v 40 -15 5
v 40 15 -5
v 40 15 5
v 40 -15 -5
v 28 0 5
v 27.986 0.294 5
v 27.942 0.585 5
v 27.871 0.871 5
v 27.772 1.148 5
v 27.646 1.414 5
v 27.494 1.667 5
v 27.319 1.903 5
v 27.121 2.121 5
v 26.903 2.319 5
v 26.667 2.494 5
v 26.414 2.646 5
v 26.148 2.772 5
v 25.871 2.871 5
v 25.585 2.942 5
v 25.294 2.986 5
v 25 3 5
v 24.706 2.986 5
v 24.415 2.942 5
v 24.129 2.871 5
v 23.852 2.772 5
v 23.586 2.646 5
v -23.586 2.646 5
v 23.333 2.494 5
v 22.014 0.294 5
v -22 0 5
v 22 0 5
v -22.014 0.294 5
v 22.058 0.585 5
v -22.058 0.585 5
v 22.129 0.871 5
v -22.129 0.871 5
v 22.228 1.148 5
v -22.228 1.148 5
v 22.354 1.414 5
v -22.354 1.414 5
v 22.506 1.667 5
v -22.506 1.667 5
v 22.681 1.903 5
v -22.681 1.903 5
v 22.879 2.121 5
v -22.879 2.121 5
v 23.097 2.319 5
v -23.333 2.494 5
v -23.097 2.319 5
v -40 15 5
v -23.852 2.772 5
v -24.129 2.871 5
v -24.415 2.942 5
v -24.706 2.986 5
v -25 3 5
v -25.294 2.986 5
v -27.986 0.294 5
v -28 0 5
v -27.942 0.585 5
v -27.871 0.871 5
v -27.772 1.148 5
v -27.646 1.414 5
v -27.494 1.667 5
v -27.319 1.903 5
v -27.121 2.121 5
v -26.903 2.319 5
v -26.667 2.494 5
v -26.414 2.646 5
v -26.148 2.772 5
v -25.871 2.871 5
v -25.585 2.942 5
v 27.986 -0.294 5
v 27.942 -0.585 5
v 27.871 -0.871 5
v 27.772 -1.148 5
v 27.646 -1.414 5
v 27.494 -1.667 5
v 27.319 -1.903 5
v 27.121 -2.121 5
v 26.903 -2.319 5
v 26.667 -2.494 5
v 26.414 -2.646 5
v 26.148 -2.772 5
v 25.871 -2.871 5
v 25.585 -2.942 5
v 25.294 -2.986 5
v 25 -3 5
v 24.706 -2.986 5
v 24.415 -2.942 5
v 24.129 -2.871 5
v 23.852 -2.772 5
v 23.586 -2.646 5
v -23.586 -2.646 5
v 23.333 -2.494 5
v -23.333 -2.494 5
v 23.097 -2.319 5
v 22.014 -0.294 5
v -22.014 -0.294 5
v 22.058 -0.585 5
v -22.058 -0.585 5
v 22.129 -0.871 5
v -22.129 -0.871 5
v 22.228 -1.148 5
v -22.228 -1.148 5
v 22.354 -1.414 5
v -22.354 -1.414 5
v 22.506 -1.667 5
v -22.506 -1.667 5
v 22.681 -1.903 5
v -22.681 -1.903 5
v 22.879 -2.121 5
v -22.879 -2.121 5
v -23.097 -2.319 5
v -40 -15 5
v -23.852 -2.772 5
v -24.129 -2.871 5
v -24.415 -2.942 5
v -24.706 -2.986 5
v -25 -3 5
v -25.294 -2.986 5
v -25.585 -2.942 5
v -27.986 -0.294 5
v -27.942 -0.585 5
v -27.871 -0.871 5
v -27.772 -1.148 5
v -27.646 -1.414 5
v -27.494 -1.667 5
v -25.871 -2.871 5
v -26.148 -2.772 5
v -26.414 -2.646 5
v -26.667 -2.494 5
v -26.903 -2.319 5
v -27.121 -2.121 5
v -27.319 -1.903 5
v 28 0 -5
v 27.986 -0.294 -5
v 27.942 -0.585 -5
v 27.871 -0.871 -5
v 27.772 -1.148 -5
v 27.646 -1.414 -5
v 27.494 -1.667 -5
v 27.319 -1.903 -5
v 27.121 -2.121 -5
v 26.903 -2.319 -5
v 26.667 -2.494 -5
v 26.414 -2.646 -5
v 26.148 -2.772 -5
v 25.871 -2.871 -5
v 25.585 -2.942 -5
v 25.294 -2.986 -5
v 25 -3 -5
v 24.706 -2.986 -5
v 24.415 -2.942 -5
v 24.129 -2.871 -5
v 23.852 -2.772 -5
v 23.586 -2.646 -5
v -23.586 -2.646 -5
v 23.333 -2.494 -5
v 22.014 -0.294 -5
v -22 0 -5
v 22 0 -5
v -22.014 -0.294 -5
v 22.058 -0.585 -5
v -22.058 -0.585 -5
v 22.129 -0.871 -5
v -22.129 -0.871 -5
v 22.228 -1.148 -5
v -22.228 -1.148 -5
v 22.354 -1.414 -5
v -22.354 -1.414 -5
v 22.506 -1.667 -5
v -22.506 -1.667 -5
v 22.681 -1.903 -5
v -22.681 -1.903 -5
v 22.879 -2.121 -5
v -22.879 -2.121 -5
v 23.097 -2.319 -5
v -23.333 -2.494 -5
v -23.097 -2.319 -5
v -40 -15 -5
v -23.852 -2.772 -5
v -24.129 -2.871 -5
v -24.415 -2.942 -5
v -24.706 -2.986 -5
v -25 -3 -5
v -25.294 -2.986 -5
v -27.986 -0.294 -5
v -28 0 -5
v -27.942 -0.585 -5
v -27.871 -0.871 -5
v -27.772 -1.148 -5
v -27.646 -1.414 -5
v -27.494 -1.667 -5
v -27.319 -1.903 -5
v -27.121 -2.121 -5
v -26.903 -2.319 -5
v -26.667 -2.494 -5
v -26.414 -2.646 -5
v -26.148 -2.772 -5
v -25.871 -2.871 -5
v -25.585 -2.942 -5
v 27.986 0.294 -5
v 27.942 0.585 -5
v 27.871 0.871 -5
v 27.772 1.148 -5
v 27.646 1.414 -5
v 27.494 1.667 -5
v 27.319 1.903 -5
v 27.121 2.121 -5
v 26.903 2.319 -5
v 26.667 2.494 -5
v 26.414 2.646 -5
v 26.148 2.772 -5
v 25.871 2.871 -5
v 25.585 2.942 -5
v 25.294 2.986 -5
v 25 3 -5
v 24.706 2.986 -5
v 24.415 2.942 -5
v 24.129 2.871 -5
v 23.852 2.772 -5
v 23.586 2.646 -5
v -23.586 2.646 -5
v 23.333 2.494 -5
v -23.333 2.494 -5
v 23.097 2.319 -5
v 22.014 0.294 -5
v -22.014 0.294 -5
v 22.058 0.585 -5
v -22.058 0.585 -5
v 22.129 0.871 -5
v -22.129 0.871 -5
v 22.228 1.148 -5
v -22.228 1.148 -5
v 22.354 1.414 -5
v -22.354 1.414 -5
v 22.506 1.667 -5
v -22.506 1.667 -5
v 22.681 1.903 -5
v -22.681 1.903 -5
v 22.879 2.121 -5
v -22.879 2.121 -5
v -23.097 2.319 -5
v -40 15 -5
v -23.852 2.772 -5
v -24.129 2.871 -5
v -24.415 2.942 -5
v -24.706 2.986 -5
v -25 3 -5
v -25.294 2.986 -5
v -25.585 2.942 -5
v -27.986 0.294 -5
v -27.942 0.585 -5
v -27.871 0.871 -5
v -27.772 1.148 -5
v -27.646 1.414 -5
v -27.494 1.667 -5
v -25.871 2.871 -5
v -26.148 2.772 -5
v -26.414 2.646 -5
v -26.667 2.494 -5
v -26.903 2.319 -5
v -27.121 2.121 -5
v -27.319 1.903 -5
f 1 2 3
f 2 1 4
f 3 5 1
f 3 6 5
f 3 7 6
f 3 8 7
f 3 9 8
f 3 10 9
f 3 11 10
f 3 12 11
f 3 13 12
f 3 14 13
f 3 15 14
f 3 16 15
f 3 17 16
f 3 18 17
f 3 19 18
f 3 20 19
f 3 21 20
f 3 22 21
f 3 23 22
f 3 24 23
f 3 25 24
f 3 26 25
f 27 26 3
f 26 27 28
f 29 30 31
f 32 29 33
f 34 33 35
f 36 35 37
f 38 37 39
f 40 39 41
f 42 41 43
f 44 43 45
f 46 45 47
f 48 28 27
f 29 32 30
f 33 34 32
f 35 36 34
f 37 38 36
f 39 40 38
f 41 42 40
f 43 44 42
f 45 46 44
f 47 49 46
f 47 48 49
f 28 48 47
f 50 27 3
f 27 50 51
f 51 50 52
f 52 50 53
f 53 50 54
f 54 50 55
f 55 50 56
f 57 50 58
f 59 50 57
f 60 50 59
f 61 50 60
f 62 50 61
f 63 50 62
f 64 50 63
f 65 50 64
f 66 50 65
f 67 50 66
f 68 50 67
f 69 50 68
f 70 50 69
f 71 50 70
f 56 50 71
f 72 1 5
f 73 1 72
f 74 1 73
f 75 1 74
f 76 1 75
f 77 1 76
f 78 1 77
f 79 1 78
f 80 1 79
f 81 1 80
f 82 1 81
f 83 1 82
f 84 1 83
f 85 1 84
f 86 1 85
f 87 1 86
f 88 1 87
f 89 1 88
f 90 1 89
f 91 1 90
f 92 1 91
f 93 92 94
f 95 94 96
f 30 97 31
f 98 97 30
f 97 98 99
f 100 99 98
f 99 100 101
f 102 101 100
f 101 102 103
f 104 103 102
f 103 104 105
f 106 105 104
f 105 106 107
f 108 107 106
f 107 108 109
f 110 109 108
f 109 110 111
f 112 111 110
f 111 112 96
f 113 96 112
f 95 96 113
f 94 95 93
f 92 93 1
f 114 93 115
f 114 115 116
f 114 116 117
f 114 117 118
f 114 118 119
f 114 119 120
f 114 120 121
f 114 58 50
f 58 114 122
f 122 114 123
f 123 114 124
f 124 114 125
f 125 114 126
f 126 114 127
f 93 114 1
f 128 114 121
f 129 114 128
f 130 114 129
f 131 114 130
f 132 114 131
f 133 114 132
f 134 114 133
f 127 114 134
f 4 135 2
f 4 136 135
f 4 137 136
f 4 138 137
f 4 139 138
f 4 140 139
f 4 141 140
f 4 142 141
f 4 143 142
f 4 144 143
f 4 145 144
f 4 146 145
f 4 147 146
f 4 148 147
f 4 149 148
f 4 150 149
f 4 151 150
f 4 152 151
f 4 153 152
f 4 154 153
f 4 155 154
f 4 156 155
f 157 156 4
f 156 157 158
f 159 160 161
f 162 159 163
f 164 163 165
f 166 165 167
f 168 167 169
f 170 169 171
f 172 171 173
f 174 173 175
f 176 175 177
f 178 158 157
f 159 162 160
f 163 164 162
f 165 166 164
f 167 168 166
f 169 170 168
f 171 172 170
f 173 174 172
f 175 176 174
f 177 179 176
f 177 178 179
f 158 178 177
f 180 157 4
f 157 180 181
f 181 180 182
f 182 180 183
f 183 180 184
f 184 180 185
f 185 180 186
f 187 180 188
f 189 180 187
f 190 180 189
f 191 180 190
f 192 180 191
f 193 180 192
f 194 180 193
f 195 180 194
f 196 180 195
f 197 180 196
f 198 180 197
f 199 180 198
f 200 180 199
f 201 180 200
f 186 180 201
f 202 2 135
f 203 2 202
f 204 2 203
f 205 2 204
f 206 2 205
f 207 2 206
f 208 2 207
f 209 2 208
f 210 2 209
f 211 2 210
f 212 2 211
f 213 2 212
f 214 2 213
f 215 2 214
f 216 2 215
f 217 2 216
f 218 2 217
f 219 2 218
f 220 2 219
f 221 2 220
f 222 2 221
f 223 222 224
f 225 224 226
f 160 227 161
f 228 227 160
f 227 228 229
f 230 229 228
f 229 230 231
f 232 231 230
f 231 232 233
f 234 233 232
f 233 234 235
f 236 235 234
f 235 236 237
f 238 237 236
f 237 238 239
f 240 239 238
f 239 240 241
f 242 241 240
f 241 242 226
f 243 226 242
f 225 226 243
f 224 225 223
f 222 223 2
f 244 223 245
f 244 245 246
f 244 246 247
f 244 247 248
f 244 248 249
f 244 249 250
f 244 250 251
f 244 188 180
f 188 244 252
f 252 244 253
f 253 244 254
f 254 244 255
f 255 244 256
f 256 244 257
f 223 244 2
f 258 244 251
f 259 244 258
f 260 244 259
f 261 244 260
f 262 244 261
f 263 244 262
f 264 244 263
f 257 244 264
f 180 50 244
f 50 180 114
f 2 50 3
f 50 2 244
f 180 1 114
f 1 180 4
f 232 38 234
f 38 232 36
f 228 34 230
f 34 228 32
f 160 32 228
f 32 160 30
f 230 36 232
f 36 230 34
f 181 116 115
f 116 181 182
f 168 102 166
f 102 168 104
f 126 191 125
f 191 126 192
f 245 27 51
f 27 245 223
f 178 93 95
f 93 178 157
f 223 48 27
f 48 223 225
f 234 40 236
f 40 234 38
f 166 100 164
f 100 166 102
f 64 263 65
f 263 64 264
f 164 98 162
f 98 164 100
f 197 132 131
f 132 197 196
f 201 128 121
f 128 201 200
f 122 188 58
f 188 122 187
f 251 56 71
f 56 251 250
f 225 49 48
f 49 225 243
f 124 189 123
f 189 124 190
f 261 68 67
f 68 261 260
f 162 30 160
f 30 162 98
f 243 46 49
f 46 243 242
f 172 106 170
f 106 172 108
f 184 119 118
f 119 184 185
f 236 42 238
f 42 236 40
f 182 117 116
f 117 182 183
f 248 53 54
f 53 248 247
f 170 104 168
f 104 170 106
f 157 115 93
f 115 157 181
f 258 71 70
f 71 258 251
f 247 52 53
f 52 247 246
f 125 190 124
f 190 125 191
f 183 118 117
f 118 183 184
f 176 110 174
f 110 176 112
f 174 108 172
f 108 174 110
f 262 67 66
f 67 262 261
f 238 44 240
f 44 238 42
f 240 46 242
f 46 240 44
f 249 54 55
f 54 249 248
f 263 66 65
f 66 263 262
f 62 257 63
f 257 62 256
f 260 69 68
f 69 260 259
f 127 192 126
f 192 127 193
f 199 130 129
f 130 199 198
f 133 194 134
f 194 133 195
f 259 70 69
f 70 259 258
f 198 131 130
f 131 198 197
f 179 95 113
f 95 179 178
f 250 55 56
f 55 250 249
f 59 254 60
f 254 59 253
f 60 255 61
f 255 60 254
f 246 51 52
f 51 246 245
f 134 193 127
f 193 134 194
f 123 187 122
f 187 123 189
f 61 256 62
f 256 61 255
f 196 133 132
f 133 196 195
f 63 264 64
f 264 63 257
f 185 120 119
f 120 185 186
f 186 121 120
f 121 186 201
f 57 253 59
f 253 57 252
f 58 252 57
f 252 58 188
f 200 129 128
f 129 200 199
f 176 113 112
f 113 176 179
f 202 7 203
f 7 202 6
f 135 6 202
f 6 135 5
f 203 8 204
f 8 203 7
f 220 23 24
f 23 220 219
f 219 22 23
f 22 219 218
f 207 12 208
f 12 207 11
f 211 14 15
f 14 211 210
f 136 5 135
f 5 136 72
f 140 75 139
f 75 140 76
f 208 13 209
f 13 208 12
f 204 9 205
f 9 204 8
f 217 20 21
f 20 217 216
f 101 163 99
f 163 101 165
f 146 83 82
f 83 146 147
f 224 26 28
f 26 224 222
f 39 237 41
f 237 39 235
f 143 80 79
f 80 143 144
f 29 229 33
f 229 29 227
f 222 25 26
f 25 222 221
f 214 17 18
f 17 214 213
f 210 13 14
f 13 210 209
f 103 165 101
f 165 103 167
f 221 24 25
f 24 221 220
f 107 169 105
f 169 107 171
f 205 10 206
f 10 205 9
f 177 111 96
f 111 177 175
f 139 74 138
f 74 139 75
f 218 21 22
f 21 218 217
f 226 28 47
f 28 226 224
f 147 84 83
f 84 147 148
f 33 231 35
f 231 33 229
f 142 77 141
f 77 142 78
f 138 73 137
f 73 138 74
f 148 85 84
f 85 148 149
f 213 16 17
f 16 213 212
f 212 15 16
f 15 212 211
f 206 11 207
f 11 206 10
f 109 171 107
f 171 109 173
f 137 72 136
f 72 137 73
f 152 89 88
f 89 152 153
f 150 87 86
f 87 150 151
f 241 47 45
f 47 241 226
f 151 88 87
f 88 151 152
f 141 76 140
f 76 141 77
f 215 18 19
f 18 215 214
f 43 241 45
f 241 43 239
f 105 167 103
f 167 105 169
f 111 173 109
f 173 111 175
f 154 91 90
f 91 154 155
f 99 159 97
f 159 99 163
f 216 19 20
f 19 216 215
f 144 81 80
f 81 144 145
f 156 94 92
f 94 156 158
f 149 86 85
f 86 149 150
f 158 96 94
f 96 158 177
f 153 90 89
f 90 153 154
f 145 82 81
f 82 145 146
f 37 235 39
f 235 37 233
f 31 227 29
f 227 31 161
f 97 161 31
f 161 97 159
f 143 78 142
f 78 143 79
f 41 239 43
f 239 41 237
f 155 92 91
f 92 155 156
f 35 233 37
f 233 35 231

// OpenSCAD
// OpenSCAD example: simple inspection jig block with holes
length = 80;
width = 30;
height = 10;
hole_d = 6;

module jig() {
  difference() {
    cube([length, width, height], center=true);
    translate([-25, 0, 0]) cylinder(h=height+2, d=hole_d, center=true, $fn=64);
    translate([ 25, 0, 0]) cylinder(h=height+2, d=hole_d, center=true, $fn=64);
  }
}

jig();
